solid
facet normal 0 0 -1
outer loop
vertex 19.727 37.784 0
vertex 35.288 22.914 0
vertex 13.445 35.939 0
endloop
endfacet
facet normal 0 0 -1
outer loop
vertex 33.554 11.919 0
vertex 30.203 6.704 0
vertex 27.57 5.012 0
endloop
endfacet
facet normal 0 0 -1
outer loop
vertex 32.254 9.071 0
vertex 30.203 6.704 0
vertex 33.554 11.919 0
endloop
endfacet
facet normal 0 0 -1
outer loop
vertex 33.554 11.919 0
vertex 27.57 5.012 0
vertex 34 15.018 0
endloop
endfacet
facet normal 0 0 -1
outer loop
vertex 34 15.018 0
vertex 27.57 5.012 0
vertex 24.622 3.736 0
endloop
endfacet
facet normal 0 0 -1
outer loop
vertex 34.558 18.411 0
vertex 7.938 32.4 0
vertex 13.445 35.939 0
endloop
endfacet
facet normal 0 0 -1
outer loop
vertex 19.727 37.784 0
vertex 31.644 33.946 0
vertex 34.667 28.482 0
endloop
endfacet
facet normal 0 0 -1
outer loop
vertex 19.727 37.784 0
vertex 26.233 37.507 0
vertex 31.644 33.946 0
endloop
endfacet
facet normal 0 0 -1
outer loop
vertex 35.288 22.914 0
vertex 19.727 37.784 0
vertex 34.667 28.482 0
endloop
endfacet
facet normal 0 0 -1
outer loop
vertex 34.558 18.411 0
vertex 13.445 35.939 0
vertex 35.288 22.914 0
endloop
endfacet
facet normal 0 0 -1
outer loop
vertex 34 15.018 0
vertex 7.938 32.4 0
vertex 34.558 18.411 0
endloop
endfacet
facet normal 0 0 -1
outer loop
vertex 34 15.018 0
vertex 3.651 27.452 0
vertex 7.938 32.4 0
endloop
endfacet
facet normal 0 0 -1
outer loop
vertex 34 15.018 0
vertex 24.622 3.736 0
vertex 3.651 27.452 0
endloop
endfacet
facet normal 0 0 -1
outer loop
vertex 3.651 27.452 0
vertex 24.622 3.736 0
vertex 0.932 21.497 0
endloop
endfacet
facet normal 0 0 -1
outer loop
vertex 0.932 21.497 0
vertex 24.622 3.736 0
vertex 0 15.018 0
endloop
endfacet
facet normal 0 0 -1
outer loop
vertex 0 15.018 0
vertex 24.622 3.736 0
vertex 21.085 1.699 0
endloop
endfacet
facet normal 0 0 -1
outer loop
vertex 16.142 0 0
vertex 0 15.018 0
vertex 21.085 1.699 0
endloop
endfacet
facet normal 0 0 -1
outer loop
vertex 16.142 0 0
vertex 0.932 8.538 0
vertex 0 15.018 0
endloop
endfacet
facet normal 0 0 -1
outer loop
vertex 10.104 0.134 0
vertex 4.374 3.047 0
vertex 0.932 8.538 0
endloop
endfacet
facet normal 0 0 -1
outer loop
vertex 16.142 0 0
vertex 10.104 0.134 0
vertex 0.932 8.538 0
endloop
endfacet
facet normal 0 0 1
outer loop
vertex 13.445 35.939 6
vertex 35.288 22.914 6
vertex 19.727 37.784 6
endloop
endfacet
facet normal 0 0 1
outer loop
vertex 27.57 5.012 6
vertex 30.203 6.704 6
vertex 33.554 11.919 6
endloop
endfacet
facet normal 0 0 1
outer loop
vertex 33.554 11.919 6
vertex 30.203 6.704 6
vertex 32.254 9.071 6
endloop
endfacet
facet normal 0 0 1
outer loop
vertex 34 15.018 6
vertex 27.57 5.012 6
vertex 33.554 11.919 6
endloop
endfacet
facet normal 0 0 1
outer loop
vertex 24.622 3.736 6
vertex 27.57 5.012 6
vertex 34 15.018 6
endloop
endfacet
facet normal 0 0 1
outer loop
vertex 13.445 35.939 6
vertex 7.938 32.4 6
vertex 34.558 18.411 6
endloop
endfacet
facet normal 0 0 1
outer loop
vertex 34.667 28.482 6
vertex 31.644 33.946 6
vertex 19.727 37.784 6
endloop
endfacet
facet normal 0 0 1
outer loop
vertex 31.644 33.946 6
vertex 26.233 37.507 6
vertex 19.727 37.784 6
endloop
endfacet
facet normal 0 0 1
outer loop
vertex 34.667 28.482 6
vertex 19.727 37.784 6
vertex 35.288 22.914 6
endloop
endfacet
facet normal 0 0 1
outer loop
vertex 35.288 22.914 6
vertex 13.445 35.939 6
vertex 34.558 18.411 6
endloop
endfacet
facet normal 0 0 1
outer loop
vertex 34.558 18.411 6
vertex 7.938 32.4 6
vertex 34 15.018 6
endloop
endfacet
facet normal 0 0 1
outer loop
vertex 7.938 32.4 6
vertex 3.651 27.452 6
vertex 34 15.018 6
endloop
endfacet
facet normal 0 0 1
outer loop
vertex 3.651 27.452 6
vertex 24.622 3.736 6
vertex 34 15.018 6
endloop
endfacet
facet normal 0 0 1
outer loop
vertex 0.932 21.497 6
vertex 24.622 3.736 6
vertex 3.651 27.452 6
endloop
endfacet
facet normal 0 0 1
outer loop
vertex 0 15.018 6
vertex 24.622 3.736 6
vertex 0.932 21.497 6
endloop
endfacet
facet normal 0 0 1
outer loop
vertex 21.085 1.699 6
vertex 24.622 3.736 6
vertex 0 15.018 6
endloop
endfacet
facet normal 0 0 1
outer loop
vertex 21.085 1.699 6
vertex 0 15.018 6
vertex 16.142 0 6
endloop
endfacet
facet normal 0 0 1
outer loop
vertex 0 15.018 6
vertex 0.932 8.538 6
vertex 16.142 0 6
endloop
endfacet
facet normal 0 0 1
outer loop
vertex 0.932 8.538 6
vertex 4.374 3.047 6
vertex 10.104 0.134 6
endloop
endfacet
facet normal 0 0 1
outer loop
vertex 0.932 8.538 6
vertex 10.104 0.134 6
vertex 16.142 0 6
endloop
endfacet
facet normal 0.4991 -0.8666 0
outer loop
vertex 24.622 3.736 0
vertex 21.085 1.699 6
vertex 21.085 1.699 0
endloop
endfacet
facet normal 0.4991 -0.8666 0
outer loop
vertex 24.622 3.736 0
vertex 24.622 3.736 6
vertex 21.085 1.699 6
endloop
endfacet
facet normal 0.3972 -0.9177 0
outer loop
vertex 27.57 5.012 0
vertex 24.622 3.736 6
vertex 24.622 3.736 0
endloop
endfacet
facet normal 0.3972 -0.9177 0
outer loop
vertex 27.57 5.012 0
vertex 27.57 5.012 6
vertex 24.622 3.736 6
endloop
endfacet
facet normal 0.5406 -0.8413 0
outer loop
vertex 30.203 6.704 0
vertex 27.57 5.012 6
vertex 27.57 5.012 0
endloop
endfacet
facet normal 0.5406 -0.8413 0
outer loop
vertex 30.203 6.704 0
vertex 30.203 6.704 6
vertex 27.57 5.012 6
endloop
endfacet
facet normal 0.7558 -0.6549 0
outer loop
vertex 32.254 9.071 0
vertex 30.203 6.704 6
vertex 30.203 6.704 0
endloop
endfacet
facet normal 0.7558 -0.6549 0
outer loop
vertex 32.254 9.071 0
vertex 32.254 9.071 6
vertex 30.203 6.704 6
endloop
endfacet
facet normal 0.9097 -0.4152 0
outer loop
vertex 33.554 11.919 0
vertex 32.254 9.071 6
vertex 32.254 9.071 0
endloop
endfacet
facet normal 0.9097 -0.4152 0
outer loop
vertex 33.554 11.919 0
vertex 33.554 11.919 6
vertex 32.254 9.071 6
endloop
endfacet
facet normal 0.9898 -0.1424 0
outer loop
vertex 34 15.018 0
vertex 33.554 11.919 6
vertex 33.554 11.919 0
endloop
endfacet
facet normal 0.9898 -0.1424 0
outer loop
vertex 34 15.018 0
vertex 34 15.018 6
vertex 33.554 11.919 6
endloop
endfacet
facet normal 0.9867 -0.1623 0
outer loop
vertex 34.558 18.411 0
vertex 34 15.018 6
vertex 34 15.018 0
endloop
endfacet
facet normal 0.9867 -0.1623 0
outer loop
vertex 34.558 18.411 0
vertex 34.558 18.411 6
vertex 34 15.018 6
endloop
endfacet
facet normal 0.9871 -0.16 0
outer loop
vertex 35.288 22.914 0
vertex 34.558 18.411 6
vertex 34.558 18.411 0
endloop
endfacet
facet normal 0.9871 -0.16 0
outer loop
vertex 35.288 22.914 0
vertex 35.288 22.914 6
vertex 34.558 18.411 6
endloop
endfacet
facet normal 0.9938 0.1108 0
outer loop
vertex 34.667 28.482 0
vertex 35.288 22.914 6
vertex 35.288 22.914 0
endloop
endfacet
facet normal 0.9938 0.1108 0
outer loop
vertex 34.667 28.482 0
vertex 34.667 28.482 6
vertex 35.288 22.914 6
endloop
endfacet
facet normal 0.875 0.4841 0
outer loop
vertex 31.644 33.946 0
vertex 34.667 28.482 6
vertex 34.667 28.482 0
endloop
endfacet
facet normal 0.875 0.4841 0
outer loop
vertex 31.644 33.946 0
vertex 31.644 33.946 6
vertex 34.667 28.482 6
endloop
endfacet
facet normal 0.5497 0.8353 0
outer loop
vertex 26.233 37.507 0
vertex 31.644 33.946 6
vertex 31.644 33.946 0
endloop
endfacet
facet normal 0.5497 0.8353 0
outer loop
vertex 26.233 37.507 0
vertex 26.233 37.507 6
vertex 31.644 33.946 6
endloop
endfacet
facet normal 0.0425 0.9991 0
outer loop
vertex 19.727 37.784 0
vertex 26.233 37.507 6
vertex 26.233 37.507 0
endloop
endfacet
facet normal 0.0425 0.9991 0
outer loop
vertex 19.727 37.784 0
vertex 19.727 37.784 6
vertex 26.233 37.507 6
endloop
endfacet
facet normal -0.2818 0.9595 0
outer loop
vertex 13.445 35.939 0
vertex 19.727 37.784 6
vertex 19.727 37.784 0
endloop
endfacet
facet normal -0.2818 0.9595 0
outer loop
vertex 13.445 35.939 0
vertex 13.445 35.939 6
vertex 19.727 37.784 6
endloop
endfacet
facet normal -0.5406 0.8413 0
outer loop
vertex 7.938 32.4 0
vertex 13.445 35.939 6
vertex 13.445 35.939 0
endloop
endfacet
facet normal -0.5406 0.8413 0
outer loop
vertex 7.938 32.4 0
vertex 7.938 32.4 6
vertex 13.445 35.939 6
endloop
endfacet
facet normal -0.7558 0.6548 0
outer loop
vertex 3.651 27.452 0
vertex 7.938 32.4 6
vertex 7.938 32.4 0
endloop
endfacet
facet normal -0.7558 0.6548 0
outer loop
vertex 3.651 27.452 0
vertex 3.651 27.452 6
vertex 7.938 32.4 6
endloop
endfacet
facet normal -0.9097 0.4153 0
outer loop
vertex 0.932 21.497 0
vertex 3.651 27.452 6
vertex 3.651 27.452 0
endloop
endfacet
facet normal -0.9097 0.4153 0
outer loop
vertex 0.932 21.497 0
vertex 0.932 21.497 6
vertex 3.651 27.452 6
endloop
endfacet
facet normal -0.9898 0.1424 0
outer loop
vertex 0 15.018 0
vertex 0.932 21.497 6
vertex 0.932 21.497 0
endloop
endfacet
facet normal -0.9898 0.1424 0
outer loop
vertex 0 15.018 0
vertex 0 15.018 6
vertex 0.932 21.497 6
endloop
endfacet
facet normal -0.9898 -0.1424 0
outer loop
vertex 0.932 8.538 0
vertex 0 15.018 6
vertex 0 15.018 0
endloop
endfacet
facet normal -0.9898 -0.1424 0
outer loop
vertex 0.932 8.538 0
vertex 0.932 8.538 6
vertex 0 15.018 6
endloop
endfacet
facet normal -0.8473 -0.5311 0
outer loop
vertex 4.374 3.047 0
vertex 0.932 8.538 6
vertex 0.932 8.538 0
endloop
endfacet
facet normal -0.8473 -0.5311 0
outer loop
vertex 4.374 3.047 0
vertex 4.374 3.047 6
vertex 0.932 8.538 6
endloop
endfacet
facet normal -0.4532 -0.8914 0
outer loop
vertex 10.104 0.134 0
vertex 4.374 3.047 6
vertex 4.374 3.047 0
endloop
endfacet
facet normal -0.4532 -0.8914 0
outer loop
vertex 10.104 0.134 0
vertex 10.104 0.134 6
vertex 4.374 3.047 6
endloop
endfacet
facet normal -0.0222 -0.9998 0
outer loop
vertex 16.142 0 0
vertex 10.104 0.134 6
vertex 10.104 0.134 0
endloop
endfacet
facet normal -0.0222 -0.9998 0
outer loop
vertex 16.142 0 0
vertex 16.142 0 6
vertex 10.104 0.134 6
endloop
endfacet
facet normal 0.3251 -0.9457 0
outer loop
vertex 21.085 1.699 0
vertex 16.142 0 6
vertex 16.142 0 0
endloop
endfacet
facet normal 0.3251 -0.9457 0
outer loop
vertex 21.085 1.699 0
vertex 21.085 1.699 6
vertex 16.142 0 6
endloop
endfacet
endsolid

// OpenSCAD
$fn = 32;

// ----------------------------------------------------------------------
// Cam disc: base radius 11.0 mm, lift 12.0 mm, 22 profile points
// ----------------------------------------------------------------------

// --- parameters (mm) ---
profile_height = 6;       // extrusion height
profile_points = 22;      // points of the closed outline

profile = [[34, 15.018], [34.558, 18.411], [35.288, 22.914], [34.667, 28.482], [31.644, 33.946], [26.233, 37.507], [19.727, 37.784], [13.445, 35.939], [7.938, 32.4], [3.651, 27.452], [0.932, 21.497], [0, 15.018], [0.932, 8.538], [4.374, 3.047], [10.104, 0.134], [16.142, 0], [21.085, 1.699], [24.622, 3.736], [27.57, 5.012], [30.203, 6.704], [32.254, 9.071], [33.554, 11.919]];  // single closed polygon, 22 points, counter clockwise

// --- the one profile operation ---
linear_extrude(height = profile_height) polygon(points = profile);
